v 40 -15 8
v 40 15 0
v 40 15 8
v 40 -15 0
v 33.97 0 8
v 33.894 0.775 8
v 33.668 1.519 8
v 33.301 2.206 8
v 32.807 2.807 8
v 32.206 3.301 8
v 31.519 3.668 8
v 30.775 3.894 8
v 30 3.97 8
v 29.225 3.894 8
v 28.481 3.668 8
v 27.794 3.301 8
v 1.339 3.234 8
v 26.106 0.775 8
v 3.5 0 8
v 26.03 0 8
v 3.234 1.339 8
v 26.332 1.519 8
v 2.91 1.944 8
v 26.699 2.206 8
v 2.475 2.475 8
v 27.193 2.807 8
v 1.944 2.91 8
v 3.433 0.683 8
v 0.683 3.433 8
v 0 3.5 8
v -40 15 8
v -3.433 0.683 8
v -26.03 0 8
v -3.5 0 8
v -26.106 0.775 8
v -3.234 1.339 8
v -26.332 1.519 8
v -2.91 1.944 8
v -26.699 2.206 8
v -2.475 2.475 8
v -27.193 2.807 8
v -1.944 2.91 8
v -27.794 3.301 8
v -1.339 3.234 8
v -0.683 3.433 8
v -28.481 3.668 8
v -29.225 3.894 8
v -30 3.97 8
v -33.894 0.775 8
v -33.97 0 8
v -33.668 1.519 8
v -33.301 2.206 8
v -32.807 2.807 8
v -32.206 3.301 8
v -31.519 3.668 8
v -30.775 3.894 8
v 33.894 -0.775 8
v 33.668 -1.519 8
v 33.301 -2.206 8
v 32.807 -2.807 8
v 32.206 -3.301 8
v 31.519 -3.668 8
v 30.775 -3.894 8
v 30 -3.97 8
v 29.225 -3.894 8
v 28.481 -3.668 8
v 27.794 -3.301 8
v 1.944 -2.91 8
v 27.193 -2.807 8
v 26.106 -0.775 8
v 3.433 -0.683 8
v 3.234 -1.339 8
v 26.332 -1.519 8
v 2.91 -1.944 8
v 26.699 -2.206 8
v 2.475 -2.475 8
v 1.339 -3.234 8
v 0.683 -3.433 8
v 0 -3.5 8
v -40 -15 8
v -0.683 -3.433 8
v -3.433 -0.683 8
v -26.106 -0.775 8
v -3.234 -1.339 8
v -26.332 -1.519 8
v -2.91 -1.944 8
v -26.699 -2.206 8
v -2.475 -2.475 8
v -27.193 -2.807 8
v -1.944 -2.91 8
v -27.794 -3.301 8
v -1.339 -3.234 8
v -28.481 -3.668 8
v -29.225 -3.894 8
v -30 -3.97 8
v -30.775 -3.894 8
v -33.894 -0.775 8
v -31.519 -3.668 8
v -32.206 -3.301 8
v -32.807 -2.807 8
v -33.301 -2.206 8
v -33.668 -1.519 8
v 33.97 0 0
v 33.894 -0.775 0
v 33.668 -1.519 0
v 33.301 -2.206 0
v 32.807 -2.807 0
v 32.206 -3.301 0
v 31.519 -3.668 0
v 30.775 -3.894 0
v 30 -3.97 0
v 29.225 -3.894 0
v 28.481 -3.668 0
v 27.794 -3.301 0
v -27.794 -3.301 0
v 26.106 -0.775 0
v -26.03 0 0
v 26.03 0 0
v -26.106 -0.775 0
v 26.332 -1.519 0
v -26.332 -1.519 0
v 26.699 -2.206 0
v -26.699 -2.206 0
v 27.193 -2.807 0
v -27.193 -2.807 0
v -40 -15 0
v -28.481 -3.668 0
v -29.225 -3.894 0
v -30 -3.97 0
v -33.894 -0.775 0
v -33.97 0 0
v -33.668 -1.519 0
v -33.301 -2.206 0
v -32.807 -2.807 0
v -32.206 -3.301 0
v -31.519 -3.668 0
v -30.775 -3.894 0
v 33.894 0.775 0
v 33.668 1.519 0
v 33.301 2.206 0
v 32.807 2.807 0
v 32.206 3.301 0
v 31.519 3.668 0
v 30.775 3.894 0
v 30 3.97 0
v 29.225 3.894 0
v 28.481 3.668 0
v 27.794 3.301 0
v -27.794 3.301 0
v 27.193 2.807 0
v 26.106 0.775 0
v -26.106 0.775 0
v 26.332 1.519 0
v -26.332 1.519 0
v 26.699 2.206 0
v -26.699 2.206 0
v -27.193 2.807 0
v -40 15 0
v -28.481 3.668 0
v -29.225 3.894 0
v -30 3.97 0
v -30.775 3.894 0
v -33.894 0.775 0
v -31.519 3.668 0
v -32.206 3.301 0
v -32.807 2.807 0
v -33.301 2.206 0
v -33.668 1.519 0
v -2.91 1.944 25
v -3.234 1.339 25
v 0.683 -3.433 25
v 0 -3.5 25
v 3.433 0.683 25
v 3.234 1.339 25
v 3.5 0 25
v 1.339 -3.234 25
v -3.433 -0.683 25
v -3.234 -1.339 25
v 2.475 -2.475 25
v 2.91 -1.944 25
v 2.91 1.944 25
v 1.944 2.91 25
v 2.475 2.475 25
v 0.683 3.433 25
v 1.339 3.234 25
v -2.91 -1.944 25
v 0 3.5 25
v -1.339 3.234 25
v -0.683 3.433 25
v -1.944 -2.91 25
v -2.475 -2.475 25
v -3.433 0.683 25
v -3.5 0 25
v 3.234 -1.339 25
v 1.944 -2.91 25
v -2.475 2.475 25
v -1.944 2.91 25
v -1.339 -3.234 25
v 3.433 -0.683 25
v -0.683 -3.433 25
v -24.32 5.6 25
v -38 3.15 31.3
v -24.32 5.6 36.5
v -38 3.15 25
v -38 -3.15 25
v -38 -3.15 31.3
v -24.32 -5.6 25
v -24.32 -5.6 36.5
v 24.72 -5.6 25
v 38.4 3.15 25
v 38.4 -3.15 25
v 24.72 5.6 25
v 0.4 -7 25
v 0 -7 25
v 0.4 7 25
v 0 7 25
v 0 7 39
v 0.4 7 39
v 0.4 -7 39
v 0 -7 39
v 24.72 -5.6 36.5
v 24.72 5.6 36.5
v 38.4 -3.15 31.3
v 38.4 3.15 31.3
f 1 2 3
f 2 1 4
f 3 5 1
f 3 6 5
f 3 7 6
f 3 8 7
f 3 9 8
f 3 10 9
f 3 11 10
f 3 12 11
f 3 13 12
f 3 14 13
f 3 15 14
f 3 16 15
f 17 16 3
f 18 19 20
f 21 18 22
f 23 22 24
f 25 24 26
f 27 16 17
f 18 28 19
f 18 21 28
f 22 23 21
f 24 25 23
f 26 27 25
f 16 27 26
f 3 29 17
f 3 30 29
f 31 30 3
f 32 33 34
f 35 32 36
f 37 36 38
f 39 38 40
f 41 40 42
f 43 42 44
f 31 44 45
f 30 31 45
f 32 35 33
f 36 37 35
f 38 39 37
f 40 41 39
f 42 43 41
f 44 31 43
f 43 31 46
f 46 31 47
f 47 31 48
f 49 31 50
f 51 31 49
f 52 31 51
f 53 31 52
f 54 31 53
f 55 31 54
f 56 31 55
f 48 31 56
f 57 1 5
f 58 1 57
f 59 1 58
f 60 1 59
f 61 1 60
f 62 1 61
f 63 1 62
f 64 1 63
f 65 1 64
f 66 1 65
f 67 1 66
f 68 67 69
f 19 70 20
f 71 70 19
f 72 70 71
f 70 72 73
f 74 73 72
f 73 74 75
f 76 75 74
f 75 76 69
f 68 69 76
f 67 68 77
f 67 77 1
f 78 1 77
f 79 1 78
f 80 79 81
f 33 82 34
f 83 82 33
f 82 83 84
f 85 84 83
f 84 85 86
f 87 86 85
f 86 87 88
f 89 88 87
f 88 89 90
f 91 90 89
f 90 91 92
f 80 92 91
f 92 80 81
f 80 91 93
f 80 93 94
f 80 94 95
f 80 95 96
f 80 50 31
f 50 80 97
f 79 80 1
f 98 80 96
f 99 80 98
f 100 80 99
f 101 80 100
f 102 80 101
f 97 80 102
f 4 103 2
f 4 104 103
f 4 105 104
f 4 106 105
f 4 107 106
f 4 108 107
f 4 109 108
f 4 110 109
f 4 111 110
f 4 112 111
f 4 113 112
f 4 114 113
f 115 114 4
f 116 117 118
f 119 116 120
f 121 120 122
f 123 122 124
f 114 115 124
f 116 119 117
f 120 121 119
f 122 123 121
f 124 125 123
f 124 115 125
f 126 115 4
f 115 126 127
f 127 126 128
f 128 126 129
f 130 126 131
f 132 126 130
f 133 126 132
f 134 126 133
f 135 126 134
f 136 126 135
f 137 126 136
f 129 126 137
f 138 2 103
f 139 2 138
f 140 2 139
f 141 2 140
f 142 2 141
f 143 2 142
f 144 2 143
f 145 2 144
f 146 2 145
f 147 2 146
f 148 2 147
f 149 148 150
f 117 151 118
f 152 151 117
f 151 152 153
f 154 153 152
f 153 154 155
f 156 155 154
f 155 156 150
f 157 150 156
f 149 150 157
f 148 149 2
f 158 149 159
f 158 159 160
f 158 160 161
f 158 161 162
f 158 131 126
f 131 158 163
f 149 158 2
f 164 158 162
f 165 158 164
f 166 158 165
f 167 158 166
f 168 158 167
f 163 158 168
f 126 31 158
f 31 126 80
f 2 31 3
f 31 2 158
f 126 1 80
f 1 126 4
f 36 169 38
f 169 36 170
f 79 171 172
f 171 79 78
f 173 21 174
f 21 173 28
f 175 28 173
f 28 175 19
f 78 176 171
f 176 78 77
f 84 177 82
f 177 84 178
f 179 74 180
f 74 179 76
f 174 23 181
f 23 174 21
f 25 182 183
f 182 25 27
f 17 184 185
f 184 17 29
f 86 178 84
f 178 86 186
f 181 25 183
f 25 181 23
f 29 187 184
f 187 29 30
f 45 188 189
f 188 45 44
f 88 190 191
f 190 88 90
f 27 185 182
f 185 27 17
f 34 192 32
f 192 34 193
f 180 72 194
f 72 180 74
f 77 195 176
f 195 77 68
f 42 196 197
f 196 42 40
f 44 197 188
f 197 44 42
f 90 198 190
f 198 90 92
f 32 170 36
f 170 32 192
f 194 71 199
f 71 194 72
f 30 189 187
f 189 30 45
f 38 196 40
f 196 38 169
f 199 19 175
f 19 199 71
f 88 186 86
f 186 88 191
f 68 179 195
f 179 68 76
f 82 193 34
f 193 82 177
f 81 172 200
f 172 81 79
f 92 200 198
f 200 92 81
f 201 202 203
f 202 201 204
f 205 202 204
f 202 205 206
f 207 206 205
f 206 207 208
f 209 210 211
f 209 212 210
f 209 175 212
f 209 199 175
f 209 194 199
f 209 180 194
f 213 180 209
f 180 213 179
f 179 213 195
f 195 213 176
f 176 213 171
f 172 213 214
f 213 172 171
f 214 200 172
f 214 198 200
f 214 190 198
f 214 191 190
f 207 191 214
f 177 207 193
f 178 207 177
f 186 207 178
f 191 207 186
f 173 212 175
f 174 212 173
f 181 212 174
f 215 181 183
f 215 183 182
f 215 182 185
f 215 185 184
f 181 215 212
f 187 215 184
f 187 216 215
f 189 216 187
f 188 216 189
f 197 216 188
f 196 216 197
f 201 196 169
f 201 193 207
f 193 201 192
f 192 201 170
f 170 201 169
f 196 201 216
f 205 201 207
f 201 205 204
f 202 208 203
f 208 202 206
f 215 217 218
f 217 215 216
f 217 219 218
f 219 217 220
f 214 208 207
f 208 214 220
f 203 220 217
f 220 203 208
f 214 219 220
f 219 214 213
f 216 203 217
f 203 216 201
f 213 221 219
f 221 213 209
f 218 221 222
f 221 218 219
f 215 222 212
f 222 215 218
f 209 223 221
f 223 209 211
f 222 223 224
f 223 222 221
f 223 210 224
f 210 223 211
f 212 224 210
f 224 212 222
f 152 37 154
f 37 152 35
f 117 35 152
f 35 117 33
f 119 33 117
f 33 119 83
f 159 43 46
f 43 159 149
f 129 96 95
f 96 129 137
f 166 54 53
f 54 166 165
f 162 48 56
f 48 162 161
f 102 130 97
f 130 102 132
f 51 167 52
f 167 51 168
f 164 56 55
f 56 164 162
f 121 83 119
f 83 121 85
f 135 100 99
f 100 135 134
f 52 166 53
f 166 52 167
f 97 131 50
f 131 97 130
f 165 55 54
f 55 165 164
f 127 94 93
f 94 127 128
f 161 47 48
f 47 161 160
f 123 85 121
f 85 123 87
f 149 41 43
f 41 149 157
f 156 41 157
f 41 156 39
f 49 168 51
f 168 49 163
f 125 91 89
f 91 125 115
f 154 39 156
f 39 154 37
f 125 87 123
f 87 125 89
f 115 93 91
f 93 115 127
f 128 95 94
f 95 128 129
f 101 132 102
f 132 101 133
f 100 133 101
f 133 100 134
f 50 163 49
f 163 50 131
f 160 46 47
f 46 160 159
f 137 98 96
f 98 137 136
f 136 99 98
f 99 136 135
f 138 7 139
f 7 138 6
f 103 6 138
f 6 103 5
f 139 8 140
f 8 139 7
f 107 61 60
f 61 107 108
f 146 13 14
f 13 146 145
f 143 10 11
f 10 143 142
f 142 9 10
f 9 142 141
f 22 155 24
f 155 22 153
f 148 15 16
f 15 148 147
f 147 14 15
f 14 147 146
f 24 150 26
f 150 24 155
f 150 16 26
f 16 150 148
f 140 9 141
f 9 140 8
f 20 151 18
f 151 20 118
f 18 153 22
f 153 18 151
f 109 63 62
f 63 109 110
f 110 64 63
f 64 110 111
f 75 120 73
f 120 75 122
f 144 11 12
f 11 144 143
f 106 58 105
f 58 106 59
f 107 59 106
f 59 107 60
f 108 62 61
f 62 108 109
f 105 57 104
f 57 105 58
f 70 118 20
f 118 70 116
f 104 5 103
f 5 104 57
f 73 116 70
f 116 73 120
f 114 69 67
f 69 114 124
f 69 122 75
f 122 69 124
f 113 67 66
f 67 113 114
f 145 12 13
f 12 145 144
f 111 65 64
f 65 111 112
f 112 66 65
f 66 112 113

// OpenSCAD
$fn = 32;

// ----------------------------------------------------------------------
// Boat cleat: 80 mm base, horn 32 mm up
// ----------------------------------------------------------------------

// --- parameters (mm) ---
base_l = 80;              // base length
base_w = 30;              // base width
base_t = 8;               // base thickness
horn_len = 76;            // horn length
horn_d = 14;              // horn diameter at the middle
horn_z = 32;              // horn axis height
end_drop = 10;            // how far the horn tips drop
post_d = 7;               // centre post diameter
holes_d = 7.94;           // fixing holes
hole_x = 30;              // fixing hole spacing

difference() {
  union() {
    translate([-40, -15, 0]) cube([base_l, base_w, base_t]);
    /* centre post, sunk 1 mm into the base */
    translate([0, 0, 7]) cylinder(h = 25, d = post_d);
    /* horn: a hull chain of boxes, full in the middle and lighter at the tips */
    hull() {
      translate([-38, -3.15, 25]) cube([0.4, 6.3, 6.3], center = false);
      translate([-24.32, -5.6, 25]) cube([0.4, 11.2, 11.5], center = false);
    }
    hull() {
      translate([-24.32, -5.6, 25]) cube([0.4, 11.2, 11.5], center = false);
      translate([0, -7, 25]) cube([0.4, 14, 14], center = false);
    }
    hull() {
      translate([0, -7, 25]) cube([0.4, 14, 14], center = false);
      translate([24.32, -5.6, 25]) cube([0.4, 11.2, 11.5], center = false);
    }
    hull() {
      translate([24.32, -5.6, 25]) cube([0.4, 11.2, 11.5], center = false);
      translate([38, -3.15, 25]) cube([0.4, 6.3, 6.3], center = false);
    }
  }
  translate([-30, 0, -2.5]) cylinder(h = base_t + 5, d = holes_d);
  translate([30, 0, -2.5]) cylinder(h = base_t + 5, d = holes_d);
}
